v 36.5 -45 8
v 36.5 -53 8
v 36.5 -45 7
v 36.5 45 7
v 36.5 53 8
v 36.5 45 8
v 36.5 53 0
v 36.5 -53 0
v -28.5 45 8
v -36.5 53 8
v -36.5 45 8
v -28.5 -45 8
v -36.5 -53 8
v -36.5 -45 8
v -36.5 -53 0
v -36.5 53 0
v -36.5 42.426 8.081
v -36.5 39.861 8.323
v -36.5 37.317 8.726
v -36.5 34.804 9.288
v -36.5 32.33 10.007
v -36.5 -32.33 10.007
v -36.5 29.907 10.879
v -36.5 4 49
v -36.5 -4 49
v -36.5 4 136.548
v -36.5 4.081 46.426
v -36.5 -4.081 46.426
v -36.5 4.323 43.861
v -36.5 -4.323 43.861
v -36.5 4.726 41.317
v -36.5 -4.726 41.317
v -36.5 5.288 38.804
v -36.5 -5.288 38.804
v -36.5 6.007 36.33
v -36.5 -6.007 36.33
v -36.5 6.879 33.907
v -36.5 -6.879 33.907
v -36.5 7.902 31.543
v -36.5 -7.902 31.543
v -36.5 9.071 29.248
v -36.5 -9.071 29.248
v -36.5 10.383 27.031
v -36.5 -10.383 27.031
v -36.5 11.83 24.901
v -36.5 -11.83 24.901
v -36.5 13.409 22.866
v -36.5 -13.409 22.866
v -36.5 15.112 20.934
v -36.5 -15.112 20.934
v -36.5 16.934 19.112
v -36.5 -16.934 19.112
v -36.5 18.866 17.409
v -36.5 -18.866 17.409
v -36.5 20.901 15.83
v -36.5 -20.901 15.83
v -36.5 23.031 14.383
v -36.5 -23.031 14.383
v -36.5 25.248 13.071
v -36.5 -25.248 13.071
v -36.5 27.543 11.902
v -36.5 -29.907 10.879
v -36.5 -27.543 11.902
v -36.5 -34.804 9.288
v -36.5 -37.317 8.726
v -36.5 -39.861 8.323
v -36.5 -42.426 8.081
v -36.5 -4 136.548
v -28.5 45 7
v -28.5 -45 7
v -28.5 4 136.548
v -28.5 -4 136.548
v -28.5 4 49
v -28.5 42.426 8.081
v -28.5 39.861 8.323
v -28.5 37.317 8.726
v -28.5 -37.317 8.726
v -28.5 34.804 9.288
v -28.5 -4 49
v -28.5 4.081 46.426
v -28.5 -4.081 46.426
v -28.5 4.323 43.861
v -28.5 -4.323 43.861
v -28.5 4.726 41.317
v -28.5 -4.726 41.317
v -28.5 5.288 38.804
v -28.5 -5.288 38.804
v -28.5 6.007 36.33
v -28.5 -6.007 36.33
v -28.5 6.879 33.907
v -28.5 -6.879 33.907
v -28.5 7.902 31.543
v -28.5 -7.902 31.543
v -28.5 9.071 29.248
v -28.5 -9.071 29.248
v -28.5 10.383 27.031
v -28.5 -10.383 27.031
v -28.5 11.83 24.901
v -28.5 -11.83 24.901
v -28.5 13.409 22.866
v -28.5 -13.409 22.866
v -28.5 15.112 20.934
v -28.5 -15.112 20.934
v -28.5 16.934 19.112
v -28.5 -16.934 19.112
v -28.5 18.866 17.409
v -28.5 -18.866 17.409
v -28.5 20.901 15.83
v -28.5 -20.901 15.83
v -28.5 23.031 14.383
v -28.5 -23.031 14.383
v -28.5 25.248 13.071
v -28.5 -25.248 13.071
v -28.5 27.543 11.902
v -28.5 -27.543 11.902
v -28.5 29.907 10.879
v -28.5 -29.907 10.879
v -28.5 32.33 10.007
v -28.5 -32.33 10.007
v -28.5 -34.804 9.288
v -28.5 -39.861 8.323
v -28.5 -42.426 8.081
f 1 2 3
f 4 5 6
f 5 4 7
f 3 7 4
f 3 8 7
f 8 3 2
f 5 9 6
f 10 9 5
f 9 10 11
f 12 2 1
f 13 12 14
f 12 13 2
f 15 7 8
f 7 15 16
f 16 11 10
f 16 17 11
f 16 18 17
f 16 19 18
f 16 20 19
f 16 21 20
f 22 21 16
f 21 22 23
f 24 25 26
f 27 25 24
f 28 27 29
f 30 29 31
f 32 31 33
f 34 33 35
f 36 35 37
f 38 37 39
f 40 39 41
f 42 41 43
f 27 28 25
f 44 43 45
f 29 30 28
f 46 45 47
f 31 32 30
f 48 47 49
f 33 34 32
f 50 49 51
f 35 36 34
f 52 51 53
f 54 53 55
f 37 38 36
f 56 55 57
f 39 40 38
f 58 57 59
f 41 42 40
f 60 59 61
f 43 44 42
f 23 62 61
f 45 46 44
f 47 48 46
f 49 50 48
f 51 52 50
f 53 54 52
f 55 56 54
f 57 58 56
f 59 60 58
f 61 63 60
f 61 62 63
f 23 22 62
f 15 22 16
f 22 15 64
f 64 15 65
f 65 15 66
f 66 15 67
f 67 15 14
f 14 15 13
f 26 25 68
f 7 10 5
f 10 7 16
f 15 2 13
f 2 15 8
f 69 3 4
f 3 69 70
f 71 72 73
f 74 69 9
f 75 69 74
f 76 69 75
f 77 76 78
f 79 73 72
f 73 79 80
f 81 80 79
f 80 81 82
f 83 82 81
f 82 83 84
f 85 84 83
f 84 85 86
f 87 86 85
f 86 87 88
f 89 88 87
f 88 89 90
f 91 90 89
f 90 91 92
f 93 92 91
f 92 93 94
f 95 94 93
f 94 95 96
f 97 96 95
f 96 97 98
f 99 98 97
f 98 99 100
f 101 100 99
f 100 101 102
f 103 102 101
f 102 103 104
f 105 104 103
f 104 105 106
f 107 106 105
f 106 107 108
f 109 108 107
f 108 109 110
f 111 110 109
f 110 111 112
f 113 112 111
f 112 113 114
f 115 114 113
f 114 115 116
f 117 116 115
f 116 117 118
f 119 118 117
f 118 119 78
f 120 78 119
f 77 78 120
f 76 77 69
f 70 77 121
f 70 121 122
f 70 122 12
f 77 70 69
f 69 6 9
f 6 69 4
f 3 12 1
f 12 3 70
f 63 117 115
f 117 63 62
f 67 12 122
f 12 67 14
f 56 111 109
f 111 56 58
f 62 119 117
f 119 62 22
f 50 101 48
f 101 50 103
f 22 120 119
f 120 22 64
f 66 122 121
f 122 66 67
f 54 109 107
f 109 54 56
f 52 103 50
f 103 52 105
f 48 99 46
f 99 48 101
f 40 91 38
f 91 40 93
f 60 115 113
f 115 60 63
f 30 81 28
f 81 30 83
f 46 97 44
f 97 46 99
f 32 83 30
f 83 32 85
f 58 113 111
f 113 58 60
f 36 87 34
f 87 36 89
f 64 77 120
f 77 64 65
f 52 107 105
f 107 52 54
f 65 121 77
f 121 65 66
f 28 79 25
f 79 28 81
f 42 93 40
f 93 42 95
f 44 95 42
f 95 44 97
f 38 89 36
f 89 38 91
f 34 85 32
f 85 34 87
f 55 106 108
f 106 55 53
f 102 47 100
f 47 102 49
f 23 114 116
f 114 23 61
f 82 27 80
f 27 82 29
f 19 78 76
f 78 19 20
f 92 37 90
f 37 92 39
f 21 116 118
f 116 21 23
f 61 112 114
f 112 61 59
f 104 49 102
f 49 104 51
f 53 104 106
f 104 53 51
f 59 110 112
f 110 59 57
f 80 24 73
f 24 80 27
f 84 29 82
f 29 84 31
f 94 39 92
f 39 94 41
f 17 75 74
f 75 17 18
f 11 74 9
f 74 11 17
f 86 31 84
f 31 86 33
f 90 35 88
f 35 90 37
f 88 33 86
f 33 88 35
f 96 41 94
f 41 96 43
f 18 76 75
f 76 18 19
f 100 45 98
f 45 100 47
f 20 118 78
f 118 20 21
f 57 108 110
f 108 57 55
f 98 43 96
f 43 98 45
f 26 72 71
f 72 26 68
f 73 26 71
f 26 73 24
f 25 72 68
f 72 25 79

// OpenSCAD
$fn = 100;
card_width = 65;
card_height = 90;
card_diagonal = sqrt(pow(card_width, 2) + pow(card_height, 2));
base_height = 8;

// Camera Settings (For Logitech StreamCam)
d_fov = 78; // degrees
camera_height = 60;

focal_length = card_diagonal / (2 * tan(d_fov / 2));

stand_height = camera_height + focal_length;



union() {
    // Base
    difference() {
        translate([0, 0, base_height/2]) cube([
            card_width + base_height,
            card_height + base_height * 2,
            base_height
        ], center=true);

        translate([
            -card_width/2 + base_height/2,
            -card_height/2,
            base_height - 1
        ]) cube([card_width, card_height, 1.5]);
    }
    
    // Stand
    translate([
        -(card_width + base_height)/2,
        -base_height / 2,
        0
    ]) {
        cube([base_height, base_height, base_height + stand_height]);
    }

    // stand support
    fillet_radius = (card_height - base_height )/ 2;
    
    difference() {
        translate([
            -(card_width + base_height)/2,
            -card_height / 2,
            0
        ]) cube([
            base_height,
            card_height,
            base_height + fillet_radius
        ]);
        
        translate([
            -(card_width + base_height),
            -fillet_radius - base_height / 2,
            base_height + fillet_radius
        ]) rotate([0, 90, 0]) cylinder(card_width + base_height, r=fillet_radius);
        
        translate([
            -(card_width + base_height),
            fillet_radius + base_height / 2,
            base_height + fillet_radius
        ]) rotate([0, 90, 0]) cylinder(card_width + base_height, r=fillet_radius);
    }
}
